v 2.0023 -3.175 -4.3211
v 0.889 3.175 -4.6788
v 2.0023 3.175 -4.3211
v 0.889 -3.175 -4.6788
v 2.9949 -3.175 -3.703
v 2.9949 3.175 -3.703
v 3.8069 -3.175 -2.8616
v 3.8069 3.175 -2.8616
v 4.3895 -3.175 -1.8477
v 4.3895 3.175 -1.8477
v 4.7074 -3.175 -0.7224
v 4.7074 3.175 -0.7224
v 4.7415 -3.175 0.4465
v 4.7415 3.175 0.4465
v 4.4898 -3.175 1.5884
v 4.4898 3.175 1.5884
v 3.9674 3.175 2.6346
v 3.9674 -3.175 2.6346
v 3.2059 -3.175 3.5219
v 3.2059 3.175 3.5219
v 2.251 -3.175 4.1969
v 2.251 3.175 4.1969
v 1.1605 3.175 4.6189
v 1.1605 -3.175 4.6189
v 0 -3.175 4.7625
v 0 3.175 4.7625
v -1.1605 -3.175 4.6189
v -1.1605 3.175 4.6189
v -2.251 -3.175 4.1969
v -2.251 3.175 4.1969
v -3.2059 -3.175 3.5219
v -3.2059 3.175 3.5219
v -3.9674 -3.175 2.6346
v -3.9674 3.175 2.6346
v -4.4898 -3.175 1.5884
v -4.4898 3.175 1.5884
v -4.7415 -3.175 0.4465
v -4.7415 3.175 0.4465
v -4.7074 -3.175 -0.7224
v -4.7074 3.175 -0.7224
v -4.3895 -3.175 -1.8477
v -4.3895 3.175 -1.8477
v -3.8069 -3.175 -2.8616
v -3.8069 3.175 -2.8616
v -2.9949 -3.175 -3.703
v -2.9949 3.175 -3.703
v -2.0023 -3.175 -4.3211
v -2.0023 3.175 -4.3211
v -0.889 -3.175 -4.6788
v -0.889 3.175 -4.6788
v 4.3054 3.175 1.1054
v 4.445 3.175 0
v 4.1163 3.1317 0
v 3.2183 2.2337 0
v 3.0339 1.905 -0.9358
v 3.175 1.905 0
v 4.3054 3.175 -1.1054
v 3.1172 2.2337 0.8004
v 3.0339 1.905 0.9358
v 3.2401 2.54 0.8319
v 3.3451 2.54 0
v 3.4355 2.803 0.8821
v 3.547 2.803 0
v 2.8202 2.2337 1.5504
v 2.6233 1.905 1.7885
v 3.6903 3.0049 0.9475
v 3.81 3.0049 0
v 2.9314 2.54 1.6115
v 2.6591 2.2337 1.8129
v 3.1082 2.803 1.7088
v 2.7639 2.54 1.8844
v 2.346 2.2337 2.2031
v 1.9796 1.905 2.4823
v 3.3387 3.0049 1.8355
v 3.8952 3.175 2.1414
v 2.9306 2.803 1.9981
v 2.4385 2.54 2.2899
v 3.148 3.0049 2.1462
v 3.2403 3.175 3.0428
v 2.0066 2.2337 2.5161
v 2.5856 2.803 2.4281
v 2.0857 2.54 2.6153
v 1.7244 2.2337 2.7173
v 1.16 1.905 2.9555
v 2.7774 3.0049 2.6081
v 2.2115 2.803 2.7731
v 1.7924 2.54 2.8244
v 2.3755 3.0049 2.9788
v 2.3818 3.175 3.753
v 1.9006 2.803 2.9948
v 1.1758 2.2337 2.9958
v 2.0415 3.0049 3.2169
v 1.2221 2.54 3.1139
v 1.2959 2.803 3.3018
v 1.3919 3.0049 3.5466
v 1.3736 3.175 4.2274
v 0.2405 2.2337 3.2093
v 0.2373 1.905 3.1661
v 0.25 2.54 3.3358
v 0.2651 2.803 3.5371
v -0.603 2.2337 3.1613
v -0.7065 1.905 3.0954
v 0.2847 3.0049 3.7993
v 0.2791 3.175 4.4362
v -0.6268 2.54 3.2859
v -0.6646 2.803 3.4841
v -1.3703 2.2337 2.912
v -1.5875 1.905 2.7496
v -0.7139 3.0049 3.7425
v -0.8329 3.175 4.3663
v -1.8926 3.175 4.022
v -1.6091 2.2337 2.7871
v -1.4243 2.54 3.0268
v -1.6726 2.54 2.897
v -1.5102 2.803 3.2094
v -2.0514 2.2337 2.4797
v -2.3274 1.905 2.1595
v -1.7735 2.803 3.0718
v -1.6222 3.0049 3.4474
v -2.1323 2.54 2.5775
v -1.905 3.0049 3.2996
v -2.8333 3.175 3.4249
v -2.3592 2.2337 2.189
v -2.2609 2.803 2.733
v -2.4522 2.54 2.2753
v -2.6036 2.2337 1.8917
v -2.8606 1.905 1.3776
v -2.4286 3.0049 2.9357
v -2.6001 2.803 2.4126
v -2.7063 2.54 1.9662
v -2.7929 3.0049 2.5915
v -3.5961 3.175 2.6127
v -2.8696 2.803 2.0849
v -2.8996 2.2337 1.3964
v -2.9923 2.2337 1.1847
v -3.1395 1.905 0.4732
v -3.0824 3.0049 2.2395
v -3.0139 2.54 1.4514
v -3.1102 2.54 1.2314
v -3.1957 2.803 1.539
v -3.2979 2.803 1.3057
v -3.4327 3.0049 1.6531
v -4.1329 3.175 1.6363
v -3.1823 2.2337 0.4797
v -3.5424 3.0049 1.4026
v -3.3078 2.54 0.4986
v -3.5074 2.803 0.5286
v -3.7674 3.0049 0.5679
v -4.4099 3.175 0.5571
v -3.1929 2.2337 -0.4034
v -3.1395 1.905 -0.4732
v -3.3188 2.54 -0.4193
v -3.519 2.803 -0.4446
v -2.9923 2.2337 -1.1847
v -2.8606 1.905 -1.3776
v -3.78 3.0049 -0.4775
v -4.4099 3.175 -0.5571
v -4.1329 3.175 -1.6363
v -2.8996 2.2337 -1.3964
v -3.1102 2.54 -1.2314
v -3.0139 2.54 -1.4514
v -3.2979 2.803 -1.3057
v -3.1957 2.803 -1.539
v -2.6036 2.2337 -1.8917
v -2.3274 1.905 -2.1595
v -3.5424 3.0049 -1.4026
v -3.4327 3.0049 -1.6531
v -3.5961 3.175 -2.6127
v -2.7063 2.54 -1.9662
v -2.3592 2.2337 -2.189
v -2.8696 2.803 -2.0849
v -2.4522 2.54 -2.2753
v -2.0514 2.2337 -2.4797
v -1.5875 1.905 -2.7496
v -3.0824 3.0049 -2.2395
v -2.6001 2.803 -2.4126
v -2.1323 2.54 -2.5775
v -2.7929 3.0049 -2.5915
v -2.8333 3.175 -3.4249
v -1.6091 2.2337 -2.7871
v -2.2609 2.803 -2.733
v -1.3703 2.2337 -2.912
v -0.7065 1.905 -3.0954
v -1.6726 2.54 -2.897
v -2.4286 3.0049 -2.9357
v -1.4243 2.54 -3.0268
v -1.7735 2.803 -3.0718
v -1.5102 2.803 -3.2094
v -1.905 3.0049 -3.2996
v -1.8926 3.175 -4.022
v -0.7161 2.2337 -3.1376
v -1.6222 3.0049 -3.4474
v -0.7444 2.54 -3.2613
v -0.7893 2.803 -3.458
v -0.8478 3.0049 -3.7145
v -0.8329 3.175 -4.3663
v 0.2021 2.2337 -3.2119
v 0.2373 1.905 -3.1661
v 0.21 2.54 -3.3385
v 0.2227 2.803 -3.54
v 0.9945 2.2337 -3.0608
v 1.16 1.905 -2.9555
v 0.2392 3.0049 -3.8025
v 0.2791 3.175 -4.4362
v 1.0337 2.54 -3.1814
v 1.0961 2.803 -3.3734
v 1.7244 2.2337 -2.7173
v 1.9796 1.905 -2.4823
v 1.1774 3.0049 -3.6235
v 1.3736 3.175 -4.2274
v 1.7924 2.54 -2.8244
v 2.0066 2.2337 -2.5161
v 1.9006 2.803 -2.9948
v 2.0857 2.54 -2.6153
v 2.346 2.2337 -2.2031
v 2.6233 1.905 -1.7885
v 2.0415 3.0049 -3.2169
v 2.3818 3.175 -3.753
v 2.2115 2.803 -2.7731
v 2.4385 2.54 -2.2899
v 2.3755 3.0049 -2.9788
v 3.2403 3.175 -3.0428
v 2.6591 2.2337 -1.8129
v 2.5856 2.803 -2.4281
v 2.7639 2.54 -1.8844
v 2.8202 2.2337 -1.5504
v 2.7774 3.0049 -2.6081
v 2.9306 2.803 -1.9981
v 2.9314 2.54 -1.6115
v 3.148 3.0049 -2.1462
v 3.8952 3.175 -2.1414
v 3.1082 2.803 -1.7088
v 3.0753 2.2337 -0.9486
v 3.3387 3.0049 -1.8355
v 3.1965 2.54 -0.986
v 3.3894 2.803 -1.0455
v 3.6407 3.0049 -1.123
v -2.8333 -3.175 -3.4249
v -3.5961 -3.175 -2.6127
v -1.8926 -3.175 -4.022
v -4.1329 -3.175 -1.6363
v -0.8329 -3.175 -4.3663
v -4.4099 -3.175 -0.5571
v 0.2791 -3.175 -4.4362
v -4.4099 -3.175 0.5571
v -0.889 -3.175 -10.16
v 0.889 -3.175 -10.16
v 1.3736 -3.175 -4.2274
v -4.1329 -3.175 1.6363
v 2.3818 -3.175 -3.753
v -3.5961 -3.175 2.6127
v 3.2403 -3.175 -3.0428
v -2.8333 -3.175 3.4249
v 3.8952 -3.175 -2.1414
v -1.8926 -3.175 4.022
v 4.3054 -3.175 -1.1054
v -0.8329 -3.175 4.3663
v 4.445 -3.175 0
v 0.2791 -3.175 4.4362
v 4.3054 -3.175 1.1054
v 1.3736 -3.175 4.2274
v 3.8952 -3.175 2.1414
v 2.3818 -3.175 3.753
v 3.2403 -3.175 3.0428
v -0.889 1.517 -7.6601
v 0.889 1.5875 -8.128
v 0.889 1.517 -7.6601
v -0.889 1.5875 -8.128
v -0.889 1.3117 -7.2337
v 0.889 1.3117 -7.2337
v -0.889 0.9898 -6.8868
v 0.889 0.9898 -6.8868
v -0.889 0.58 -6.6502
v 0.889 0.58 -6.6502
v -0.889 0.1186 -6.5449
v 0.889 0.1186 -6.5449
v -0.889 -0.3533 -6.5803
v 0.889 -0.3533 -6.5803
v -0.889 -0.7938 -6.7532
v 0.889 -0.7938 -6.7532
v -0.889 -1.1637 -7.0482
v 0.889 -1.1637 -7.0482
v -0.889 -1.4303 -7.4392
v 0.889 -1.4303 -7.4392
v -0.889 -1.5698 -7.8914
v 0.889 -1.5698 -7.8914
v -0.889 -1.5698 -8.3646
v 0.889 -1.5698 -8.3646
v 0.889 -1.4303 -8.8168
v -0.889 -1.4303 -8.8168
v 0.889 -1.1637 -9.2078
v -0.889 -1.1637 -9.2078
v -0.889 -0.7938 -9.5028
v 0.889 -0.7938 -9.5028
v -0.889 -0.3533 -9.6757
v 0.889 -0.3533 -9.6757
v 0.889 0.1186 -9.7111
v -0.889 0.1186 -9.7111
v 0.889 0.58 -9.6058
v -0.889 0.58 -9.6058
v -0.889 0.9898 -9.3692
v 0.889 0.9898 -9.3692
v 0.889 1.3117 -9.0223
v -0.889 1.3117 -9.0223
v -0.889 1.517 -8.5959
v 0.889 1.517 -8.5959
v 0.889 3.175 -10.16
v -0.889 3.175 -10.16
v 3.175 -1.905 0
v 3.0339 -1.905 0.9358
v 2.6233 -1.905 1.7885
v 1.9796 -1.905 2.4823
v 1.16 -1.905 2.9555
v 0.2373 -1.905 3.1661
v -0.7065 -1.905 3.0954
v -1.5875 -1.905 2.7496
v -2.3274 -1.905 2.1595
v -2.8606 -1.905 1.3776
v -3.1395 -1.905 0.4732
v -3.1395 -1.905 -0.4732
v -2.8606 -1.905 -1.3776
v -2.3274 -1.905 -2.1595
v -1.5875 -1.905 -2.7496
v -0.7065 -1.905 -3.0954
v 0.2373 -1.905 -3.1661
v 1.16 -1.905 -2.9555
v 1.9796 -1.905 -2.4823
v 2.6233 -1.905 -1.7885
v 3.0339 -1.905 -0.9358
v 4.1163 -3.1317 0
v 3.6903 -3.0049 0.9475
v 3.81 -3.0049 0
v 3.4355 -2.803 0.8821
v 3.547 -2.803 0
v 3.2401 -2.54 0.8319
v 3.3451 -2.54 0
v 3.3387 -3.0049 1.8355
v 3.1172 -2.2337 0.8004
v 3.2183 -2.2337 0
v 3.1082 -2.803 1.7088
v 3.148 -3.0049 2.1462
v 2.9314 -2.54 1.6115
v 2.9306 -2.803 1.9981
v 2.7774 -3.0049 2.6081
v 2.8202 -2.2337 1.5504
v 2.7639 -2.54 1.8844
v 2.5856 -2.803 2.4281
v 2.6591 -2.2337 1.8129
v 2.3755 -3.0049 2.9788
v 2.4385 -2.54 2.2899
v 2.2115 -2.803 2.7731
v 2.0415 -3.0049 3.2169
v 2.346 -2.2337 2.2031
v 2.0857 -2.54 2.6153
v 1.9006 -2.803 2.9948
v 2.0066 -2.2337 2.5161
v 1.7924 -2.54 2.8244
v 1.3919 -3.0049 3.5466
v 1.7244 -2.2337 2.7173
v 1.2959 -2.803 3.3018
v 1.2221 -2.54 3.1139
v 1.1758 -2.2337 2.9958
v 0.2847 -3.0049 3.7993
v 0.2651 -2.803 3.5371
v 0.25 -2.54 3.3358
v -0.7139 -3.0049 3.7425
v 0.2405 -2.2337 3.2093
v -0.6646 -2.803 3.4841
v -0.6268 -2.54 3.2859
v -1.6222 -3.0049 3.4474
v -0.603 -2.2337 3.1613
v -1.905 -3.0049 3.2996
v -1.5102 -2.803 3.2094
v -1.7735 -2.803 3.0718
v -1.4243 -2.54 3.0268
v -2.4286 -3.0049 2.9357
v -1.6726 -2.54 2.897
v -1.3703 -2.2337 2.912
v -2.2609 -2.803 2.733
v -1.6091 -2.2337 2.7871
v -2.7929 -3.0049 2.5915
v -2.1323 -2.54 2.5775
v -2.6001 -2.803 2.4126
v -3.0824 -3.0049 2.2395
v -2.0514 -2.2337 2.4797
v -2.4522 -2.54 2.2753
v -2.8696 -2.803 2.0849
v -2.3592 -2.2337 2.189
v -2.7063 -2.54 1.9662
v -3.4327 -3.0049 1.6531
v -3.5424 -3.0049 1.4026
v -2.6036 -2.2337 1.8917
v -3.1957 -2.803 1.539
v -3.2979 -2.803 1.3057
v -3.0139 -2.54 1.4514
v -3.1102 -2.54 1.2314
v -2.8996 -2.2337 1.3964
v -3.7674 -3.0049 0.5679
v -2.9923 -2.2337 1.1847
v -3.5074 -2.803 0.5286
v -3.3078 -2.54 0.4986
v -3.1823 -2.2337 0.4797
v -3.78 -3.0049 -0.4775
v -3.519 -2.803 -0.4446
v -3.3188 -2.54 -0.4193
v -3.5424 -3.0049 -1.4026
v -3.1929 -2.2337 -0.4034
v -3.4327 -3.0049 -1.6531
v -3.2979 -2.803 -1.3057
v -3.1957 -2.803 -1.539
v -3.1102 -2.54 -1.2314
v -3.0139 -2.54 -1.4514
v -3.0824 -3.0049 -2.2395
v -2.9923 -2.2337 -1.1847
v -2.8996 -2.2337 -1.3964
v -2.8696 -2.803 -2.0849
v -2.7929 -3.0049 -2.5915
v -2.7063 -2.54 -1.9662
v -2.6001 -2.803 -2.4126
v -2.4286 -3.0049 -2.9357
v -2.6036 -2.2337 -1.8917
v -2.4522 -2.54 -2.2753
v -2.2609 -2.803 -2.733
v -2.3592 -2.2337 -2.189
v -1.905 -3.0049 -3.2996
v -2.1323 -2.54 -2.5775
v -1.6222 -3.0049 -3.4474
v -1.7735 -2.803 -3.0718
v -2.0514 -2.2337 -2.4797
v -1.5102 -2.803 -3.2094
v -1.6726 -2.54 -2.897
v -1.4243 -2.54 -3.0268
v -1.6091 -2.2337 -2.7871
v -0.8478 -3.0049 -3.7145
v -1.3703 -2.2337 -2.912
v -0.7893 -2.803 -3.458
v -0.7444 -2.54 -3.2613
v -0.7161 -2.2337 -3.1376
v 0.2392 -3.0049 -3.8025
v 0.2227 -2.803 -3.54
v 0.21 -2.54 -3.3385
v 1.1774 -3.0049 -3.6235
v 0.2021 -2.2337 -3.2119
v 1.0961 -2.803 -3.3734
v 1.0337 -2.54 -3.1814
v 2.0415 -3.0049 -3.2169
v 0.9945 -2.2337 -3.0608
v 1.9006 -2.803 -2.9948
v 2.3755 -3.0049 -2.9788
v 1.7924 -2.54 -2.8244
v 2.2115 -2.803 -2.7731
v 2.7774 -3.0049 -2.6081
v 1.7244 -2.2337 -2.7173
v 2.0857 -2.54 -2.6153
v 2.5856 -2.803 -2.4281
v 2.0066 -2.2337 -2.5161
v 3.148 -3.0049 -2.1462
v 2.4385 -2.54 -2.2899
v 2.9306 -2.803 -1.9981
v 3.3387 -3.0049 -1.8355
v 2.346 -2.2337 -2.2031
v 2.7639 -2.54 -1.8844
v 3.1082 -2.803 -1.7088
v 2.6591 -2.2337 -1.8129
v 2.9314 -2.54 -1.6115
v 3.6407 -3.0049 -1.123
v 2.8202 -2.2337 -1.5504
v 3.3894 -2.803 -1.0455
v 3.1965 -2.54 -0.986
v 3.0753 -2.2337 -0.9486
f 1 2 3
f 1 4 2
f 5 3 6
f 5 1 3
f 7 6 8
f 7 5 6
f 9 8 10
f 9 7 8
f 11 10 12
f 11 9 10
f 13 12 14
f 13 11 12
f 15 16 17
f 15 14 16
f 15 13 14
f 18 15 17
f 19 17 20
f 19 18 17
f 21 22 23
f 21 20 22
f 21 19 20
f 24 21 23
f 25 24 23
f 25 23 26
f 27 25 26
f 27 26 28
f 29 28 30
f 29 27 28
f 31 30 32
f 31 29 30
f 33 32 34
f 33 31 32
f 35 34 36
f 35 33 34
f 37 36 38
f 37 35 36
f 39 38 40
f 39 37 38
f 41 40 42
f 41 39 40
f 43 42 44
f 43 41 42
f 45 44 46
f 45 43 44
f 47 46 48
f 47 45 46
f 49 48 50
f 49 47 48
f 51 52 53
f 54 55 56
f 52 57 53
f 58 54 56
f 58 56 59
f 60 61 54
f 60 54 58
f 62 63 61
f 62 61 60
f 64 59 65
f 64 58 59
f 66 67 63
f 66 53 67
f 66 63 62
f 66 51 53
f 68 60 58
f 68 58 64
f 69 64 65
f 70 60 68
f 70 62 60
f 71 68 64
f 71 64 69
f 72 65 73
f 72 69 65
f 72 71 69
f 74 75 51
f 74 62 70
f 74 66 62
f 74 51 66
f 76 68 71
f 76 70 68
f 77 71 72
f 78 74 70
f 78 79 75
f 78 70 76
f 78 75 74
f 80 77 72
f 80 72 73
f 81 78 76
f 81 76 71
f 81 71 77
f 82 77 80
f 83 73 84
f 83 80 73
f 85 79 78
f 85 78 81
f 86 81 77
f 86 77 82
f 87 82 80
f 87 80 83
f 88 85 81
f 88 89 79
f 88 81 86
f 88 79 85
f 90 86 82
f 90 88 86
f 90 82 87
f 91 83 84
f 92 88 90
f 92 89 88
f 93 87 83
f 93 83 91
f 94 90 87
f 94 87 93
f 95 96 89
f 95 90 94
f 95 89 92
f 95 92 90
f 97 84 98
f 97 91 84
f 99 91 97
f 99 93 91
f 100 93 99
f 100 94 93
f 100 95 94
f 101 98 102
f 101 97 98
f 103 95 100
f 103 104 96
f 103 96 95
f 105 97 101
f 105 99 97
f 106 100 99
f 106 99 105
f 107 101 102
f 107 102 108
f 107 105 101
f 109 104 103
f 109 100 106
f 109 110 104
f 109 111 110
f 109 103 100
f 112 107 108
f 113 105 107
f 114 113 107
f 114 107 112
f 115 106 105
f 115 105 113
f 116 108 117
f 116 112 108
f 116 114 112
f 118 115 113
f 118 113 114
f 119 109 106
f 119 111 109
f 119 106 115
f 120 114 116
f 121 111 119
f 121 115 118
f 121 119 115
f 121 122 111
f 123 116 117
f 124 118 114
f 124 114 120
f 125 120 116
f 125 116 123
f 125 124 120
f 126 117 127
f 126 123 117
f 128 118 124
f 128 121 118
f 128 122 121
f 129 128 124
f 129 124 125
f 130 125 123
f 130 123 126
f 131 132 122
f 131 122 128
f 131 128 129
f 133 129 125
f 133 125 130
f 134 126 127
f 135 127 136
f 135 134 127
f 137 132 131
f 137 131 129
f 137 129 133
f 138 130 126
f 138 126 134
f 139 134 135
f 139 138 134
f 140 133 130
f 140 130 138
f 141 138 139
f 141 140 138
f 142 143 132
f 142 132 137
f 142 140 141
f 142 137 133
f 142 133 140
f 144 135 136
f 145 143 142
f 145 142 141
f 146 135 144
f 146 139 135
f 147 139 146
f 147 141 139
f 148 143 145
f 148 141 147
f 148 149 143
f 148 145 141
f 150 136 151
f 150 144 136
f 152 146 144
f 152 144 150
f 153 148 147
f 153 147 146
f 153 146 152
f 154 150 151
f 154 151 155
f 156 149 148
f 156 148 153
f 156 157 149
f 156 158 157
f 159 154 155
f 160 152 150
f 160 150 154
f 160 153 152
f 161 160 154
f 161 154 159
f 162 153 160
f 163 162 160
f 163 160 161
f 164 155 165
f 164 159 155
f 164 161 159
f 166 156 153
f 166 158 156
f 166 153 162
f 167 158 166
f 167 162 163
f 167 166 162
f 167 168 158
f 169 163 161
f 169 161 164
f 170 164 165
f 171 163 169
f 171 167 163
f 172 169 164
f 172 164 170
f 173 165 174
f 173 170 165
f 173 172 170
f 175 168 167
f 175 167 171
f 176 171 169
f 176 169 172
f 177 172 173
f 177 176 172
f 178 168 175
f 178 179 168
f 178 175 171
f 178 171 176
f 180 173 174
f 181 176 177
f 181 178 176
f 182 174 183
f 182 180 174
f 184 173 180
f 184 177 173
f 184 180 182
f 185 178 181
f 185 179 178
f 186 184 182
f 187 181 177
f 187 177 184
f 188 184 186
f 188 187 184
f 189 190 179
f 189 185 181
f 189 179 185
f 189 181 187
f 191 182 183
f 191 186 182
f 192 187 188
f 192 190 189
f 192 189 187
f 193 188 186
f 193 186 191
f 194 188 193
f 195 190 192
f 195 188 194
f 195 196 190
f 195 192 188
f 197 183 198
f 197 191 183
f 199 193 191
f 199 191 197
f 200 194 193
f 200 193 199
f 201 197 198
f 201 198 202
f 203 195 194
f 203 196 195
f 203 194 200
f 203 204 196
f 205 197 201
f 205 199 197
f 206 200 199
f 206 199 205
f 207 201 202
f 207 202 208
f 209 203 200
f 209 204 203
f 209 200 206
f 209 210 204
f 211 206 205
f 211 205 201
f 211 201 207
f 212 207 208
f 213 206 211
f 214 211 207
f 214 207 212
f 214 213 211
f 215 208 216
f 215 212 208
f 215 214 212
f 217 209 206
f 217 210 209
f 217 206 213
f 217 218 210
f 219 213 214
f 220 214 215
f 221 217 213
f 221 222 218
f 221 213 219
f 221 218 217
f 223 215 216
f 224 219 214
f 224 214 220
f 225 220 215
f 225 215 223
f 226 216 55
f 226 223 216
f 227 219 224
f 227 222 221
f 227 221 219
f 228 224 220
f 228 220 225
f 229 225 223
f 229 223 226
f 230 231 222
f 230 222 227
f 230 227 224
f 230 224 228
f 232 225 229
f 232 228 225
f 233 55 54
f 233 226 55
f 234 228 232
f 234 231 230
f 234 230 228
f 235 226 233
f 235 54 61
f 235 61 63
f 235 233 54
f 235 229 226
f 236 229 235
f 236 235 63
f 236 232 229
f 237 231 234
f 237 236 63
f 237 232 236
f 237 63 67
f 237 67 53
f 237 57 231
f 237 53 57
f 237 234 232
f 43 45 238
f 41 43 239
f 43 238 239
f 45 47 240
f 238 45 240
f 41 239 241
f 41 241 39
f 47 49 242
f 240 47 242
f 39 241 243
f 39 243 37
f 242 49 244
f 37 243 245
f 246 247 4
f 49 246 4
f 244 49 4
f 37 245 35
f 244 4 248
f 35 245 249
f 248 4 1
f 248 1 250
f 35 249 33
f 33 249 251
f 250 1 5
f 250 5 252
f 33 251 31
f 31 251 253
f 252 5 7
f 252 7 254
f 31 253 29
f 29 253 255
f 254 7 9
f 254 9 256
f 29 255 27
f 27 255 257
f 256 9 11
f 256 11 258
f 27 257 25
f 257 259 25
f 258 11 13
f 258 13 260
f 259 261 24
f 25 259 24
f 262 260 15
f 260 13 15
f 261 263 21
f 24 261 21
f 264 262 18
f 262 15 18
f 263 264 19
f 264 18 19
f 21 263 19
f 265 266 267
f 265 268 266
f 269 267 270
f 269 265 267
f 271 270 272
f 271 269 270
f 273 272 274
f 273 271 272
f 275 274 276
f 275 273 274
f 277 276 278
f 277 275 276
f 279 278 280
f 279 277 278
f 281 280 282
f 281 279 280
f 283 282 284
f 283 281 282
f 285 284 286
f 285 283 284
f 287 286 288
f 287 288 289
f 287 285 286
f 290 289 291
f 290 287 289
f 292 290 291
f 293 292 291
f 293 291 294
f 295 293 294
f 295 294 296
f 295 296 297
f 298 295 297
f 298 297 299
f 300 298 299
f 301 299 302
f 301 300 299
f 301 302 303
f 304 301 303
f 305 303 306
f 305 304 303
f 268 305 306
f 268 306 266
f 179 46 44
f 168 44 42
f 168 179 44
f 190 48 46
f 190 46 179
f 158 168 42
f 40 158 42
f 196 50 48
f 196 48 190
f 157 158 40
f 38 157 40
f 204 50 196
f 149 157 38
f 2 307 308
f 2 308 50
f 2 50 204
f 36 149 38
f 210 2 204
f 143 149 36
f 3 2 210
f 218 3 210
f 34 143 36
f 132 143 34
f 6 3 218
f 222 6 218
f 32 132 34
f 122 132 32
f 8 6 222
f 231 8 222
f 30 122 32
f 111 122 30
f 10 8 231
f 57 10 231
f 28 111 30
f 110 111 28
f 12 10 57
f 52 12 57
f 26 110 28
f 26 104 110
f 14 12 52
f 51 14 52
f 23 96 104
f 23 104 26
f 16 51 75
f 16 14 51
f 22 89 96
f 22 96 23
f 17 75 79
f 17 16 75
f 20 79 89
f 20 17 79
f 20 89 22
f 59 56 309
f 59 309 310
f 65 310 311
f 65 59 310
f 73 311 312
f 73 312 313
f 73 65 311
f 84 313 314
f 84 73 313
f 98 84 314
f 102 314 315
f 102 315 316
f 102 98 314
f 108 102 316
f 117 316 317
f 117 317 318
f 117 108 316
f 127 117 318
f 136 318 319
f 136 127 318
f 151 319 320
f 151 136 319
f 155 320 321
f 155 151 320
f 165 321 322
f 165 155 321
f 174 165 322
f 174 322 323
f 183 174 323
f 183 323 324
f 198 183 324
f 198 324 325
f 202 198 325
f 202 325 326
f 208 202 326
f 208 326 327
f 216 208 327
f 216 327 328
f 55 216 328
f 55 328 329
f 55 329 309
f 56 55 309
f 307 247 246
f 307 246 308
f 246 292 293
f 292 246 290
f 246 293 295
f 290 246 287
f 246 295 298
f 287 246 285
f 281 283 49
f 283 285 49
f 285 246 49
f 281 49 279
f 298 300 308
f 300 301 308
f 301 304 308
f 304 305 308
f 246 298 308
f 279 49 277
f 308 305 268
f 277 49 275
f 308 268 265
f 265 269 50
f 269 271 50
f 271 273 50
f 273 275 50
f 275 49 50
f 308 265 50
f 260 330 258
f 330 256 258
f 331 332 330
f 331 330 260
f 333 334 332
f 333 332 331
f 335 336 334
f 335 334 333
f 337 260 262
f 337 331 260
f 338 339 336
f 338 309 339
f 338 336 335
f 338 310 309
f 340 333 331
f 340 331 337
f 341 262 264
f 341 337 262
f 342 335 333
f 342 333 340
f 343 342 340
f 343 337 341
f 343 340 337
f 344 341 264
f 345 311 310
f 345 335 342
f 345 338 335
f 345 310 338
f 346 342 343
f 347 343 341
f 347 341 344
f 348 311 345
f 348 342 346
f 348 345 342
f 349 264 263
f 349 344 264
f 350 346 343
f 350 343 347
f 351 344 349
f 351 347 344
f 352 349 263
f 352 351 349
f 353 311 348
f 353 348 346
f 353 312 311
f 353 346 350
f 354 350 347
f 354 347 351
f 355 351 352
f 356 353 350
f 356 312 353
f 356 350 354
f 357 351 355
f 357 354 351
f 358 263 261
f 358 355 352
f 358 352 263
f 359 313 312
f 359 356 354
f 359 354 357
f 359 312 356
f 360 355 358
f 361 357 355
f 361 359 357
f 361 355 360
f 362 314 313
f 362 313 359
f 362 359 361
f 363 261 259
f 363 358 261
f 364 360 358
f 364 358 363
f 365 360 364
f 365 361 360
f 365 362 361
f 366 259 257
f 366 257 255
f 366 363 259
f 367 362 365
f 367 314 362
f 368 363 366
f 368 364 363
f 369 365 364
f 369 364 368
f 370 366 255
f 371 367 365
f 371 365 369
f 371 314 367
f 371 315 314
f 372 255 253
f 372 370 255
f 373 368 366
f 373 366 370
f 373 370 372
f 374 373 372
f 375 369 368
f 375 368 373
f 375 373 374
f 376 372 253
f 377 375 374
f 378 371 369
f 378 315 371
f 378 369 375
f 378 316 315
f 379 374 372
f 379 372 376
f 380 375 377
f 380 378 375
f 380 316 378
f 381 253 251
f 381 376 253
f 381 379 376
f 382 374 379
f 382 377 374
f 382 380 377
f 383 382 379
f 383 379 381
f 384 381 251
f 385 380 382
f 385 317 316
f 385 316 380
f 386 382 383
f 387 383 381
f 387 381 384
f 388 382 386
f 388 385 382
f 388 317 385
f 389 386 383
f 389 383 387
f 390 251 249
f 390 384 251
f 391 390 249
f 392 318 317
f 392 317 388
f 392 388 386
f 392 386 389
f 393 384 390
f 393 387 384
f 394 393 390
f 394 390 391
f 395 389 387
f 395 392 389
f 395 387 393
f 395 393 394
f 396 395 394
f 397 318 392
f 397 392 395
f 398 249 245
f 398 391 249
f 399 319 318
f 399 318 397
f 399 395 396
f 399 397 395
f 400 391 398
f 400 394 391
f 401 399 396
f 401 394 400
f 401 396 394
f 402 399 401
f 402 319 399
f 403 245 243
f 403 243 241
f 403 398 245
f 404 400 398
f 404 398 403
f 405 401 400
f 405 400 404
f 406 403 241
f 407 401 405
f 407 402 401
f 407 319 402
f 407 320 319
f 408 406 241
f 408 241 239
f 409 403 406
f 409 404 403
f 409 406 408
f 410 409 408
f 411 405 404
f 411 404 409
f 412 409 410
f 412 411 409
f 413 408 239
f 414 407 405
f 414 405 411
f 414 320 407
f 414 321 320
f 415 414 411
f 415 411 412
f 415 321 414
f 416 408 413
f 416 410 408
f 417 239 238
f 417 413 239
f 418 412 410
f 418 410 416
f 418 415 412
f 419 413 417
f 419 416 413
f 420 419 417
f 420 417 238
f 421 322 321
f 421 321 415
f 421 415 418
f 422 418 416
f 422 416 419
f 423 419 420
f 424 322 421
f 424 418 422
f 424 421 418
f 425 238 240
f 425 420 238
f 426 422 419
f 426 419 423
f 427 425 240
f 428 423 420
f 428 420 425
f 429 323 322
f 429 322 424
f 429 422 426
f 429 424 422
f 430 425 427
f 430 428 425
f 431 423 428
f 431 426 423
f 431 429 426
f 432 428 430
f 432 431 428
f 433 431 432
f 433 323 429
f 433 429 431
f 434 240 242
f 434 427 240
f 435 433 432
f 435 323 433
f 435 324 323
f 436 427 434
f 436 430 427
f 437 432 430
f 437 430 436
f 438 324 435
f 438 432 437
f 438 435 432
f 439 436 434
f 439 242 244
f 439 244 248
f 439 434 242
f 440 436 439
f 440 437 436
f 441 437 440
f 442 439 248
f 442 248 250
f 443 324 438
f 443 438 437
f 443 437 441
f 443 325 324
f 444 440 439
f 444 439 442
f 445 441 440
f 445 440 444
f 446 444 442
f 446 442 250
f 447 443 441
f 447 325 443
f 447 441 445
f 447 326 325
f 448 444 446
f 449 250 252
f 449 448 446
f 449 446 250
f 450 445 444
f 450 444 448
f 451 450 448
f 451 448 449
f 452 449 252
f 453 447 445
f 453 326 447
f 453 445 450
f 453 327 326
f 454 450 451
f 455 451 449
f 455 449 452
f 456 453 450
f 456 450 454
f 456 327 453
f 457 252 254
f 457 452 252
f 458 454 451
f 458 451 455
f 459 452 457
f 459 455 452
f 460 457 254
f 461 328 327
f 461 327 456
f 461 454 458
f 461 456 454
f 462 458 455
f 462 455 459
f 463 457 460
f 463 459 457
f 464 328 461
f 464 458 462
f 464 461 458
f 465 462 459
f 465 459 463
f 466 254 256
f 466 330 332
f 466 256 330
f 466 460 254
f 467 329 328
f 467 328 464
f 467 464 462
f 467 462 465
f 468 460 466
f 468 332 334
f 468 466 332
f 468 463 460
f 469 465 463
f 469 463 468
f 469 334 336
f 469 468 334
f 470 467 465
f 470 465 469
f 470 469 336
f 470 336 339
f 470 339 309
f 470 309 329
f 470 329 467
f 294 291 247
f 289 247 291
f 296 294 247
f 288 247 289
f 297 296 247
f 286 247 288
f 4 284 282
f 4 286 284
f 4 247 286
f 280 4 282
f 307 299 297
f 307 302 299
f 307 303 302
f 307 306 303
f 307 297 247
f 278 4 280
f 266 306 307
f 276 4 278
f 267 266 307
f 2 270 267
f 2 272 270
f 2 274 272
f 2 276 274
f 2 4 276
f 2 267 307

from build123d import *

# Parameters (mm, degrees)
F0_R     = 4.7625
F0_R_2   = 3.175
F1_DEPTH = 3.175
F2_W     = 6.35
F2_H     = 6.35
F2_R     = 1.5875
F3_DEPTH = 0.889
F4_R     = 1.27


with BuildPart() as f1:
    # F0 (on Front) → F1 (new body, symmetric)
    with BuildSketch(Plane.XZ):
        Circle(F0_R)
        Circle(F0_R_2, mode=Mode.SUBTRACT)
    extrude(amount=F1_DEPTH, both=True)

    # F2 (on Right) → F3 (join, symmetric)
    with BuildSketch(Plane.YZ):
        with Locations((0, -6.985)):
            Rectangle(F2_W, F2_H)
        with Locations((0, -8.128)):
            Circle(F2_R, mode=Mode.SUBTRACT)
    extrude(amount=F3_DEPTH, both=True)

    # F4
    f4_edges = [f1.edges().sort_by_distance(p)[0] for p in [
        (-3.175, -3.175, 0),
        (-3.175, 3.175, 0),
    ]]
    fillet(f4_edges, radius=F4_R)


solid = f1.part
